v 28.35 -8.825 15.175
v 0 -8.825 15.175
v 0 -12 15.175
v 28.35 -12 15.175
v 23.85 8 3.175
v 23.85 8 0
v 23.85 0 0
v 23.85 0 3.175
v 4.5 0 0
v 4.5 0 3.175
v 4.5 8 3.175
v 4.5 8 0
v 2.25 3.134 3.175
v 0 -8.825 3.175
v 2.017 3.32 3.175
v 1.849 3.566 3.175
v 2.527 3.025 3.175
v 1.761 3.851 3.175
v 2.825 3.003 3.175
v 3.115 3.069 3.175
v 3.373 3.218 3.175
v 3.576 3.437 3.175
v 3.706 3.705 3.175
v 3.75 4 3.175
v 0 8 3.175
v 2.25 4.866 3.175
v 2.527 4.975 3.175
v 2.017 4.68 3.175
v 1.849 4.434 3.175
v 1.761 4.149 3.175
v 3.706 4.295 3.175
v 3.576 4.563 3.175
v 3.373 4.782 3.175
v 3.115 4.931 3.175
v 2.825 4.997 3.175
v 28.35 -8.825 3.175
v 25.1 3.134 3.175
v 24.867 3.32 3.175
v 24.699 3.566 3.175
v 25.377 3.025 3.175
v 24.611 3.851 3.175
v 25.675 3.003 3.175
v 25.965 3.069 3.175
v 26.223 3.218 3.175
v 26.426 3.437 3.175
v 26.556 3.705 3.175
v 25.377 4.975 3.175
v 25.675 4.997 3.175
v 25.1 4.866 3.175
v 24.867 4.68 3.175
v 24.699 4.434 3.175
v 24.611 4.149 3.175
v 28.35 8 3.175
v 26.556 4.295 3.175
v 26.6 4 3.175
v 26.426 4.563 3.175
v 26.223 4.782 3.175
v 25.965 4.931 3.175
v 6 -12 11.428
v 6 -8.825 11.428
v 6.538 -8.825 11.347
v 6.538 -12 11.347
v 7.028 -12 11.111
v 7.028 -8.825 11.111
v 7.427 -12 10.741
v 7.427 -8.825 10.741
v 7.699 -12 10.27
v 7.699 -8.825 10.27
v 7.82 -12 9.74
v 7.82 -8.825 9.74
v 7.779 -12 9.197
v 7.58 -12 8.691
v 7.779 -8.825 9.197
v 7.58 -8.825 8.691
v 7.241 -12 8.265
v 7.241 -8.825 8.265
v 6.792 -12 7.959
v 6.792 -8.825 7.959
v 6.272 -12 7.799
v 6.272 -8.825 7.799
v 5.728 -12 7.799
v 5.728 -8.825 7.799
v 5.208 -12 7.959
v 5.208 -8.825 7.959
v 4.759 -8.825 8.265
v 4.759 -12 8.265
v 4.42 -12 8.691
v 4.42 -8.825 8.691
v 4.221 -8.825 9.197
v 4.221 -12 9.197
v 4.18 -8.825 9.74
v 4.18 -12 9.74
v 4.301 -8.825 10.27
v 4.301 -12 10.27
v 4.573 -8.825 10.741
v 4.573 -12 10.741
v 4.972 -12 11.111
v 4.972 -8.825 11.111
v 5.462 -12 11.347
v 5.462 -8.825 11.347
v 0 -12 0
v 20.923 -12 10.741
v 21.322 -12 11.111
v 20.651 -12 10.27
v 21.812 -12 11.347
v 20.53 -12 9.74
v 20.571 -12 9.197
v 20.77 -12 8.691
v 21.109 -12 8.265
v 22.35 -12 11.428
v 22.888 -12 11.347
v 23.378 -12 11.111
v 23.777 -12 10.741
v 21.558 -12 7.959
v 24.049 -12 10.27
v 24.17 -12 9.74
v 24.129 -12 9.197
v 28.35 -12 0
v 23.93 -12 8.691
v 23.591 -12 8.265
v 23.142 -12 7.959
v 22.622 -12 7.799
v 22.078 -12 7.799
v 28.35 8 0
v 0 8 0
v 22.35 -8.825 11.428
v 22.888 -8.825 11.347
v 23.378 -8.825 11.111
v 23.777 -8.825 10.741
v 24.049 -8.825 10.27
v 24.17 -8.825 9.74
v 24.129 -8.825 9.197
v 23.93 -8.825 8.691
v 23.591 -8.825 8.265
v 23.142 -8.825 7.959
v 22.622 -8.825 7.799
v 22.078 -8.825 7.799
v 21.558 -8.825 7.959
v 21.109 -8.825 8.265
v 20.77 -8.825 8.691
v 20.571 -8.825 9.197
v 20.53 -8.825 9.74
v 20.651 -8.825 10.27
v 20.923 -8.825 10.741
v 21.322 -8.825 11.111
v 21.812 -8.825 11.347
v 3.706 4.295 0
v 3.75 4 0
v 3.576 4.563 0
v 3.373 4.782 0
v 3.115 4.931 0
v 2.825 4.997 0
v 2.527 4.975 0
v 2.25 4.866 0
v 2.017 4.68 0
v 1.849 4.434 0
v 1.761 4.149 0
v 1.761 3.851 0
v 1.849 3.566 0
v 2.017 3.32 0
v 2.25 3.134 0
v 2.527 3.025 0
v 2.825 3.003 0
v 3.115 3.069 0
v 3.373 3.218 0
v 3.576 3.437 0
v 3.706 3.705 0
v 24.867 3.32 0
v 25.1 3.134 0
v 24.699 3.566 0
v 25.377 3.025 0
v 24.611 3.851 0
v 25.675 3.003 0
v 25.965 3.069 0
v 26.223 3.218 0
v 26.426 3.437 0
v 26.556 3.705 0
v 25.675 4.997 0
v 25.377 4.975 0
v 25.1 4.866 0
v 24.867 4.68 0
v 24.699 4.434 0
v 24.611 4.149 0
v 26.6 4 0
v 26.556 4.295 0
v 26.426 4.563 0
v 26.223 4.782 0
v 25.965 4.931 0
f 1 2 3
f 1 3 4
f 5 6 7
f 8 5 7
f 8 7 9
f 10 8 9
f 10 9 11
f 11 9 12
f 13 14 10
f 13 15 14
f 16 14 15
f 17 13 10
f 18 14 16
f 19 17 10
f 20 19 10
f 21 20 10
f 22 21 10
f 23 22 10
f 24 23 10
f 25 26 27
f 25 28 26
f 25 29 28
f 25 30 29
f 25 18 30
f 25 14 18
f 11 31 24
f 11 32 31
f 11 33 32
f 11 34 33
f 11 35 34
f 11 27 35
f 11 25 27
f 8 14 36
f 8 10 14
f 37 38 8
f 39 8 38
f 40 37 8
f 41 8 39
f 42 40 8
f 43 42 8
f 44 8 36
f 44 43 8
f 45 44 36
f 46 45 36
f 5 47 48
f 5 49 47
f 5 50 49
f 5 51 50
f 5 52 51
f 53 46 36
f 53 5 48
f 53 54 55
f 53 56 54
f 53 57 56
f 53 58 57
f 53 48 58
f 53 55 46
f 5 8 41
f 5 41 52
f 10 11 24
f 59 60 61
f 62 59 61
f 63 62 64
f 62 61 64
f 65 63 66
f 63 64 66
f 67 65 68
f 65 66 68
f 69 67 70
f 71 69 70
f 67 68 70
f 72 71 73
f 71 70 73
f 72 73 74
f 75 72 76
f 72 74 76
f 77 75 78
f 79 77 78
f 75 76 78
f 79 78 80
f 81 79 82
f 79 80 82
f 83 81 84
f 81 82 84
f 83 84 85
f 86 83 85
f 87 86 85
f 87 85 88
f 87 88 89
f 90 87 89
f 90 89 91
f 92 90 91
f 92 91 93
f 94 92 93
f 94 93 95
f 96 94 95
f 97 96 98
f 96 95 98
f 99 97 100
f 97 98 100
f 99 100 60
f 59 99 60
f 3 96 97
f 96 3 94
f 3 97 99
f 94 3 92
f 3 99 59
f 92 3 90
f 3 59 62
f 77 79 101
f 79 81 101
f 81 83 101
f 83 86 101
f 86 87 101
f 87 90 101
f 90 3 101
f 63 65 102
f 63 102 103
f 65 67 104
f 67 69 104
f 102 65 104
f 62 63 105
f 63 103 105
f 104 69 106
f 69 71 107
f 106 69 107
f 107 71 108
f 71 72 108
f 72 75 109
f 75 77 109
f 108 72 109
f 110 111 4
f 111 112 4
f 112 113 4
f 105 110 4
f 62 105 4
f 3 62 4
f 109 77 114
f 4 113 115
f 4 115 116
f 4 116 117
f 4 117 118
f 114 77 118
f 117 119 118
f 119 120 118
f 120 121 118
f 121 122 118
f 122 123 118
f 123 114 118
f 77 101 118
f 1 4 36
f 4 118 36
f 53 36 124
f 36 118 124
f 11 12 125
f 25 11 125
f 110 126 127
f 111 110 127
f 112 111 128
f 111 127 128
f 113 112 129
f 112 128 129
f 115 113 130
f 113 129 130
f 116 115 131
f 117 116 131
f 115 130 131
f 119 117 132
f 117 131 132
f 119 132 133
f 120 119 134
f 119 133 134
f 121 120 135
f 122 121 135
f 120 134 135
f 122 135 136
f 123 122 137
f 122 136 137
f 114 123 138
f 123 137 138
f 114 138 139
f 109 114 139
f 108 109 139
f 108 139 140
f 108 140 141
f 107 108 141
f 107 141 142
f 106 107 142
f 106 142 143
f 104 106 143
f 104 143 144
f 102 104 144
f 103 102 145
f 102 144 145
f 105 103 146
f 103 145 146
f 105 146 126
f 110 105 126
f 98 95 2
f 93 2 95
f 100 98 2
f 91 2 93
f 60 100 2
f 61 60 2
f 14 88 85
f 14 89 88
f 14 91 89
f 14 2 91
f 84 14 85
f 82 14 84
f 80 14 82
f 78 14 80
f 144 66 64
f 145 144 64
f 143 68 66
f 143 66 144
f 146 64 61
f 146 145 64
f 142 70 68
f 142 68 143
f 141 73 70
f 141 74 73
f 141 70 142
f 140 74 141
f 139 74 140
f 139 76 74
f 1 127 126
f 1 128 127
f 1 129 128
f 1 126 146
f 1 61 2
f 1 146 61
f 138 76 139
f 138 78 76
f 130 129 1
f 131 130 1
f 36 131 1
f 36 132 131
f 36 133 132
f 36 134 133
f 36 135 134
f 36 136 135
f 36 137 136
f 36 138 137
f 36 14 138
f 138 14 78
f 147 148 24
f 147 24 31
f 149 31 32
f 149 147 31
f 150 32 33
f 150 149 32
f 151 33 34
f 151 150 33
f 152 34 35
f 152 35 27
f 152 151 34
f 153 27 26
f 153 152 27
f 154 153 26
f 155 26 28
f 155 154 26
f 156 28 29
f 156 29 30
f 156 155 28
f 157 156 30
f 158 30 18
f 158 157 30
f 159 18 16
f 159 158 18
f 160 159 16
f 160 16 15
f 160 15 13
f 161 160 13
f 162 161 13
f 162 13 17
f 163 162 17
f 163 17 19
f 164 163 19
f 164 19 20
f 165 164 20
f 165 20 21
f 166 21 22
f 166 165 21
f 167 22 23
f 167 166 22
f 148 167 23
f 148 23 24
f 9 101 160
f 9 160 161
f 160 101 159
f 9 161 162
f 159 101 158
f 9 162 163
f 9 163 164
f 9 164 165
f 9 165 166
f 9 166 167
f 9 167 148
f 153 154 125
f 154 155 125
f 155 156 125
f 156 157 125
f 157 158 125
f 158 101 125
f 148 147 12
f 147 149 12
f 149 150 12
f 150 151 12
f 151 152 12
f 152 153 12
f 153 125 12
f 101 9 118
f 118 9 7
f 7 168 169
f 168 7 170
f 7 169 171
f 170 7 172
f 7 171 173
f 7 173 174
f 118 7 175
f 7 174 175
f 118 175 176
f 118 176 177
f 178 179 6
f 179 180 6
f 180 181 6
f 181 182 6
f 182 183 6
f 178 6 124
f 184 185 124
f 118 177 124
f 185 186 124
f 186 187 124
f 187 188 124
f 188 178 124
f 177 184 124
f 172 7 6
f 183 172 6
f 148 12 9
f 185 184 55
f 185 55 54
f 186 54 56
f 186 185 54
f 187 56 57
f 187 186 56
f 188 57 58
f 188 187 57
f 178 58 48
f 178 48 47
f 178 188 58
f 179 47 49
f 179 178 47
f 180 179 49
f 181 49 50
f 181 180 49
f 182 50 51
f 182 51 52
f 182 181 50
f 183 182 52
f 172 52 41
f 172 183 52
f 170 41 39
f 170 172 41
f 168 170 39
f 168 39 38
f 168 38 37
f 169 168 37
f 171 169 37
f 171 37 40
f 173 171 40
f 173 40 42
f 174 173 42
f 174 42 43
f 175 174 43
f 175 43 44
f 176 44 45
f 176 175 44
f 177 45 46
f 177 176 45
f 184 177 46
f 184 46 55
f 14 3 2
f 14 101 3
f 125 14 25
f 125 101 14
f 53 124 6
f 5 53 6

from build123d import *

# Parameters (mm, degrees)
SKETCH1_R           = 1
BOSS_EXTRUDE1_DEPTH = 3.175
SKETCH2_W           = 28.35
SKETCH2_H           = 3.175
BOSS_EXTRUDE2_DEPTH = 12
SKETCH3_R           = 1.825
CUT_EXTRUDE1_DEPTH  = 3.175


with BuildPart() as part:
    # Sketch1 → Boss-Extrude1 (new body)
    with BuildSketch(Plane.XY):
        Polygon((0, 8), (0, 0), (0, -12), (28.35, -12), (28.35, 8), (23.85, 8), (23.85, 0), (4.5, 0), (4.5, 8), align=None)
        with Locations((2.75, 4)):
            Circle(SKETCH1_R, mode=Mode.SUBTRACT)
        with Locations((25.6, 4)):
            Circle(SKETCH1_R, mode=Mode.SUBTRACT)
    extrude(amount=BOSS_EXTRUDE1_DEPTH)

    # Sketch2 → Boss-Extrude2 (add)
    with BuildSketch(Plane.XY.offset(3.175)):
        with Locations((14.175, -10.4125)):
            Rectangle(SKETCH2_W, SKETCH2_H)
    extrude(amount=BOSS_EXTRUDE2_DEPTH)

    # Sketch3 → Cut-Extrude1 (cut)
    with BuildSketch(Plane(origin=(0, -8.825, 0), x_dir=(1, 0, 0), z_dir=(0, 1, 0))):
        with Locations(Location((6, -9.60325543, 0), (0, 0, 270))):
            Circle(SKETCH3_R)
        with Locations(Location((22.35, -9.60325543, 0), (0, 0, 270))):
            Circle(SKETCH3_R)
    extrude(amount=-CUT_EXTRUDE1_DEPTH, mode=Mode.SUBTRACT)


solid = part.part
